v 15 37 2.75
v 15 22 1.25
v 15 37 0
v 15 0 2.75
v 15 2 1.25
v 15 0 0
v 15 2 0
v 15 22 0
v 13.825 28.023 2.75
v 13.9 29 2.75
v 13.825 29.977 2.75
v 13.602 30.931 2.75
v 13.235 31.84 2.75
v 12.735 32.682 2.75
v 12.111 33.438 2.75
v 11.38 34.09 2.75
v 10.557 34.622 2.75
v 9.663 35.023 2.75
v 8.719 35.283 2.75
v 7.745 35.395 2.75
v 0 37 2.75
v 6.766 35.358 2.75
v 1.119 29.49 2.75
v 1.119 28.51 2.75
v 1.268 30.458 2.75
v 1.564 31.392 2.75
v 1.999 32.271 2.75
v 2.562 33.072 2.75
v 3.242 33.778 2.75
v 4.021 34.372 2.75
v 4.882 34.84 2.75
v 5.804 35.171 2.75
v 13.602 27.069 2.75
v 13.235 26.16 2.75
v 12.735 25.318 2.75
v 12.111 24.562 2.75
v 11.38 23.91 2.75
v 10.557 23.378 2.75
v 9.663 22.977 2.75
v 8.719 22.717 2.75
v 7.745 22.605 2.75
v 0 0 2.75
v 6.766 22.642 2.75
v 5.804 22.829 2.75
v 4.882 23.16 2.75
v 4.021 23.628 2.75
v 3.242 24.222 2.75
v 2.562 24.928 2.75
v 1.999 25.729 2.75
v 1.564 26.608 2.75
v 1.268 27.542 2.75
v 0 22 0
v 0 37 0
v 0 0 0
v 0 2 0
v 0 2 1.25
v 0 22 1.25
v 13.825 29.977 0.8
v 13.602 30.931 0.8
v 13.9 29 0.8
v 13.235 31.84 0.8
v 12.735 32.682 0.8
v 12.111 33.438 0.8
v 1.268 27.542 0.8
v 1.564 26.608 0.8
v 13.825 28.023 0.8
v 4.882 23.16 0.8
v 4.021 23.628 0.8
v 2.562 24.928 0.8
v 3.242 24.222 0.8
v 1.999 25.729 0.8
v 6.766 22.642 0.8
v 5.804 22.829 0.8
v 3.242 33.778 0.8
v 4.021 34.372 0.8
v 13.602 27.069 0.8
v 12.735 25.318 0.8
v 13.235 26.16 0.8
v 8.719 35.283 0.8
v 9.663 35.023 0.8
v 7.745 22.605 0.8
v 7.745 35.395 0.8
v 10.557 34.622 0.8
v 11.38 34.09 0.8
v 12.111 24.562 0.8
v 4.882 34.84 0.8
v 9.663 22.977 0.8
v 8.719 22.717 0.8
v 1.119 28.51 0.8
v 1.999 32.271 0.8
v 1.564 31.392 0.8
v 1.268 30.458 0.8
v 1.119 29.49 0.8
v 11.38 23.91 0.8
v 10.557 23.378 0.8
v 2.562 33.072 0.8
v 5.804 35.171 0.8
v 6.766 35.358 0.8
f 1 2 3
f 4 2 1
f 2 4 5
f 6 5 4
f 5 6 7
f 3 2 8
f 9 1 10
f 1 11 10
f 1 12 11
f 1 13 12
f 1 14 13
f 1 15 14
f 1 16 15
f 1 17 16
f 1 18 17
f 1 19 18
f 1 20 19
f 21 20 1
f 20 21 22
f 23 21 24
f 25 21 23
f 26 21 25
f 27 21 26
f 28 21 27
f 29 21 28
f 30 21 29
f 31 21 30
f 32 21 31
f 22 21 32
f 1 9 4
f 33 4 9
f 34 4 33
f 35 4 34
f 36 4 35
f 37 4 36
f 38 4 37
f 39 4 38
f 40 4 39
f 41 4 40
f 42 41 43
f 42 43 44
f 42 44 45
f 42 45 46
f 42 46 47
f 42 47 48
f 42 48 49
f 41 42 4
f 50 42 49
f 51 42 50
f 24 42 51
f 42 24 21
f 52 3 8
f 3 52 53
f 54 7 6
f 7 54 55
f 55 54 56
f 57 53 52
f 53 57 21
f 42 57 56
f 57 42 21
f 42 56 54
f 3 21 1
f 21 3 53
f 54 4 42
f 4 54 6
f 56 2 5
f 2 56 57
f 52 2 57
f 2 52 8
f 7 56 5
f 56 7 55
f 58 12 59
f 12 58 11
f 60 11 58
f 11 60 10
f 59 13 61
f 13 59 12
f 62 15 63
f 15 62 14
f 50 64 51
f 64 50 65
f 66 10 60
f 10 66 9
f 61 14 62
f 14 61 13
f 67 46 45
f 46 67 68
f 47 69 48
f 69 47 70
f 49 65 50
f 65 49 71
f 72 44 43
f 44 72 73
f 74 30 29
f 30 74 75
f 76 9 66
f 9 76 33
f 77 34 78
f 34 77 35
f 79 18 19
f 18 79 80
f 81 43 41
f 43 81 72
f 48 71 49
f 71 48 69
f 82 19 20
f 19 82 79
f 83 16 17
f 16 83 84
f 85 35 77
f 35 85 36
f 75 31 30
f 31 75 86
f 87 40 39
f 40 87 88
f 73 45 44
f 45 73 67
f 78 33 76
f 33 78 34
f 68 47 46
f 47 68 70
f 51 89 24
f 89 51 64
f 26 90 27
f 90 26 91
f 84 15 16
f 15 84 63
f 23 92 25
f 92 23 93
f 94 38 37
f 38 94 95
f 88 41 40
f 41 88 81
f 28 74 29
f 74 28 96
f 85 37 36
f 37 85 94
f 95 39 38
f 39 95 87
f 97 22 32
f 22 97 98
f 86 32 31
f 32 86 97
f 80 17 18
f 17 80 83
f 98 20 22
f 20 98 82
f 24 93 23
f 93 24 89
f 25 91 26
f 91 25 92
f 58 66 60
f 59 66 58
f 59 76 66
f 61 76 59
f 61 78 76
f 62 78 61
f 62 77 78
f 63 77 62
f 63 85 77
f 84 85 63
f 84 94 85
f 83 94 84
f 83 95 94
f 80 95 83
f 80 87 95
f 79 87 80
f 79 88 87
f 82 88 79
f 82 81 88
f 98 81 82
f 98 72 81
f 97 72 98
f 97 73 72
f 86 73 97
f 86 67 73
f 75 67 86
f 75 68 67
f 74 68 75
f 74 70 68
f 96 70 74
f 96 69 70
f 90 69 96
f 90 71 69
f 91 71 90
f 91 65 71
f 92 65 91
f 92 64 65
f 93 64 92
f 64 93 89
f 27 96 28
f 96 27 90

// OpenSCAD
echo(version=version());
$fa=1;
$fs=1;

// Values are in millimeters
extusion_width=0.4;

thickness = 1.75;
length=20;

magnet_d=12;
m_buf=3;

lip=2;

difference() {
	width=magnet_d+m_buf;

	cube([width, length + width + lip, thickness+1]);

	translate([-.5, lip, -0.5])
		cube([width+1, length, thickness]);

	translate([width/2, length + m_buf + magnet_d/2, extusion_width*2])
		cylinder(d=magnet_d + extusion_width*2, h=4);
}
